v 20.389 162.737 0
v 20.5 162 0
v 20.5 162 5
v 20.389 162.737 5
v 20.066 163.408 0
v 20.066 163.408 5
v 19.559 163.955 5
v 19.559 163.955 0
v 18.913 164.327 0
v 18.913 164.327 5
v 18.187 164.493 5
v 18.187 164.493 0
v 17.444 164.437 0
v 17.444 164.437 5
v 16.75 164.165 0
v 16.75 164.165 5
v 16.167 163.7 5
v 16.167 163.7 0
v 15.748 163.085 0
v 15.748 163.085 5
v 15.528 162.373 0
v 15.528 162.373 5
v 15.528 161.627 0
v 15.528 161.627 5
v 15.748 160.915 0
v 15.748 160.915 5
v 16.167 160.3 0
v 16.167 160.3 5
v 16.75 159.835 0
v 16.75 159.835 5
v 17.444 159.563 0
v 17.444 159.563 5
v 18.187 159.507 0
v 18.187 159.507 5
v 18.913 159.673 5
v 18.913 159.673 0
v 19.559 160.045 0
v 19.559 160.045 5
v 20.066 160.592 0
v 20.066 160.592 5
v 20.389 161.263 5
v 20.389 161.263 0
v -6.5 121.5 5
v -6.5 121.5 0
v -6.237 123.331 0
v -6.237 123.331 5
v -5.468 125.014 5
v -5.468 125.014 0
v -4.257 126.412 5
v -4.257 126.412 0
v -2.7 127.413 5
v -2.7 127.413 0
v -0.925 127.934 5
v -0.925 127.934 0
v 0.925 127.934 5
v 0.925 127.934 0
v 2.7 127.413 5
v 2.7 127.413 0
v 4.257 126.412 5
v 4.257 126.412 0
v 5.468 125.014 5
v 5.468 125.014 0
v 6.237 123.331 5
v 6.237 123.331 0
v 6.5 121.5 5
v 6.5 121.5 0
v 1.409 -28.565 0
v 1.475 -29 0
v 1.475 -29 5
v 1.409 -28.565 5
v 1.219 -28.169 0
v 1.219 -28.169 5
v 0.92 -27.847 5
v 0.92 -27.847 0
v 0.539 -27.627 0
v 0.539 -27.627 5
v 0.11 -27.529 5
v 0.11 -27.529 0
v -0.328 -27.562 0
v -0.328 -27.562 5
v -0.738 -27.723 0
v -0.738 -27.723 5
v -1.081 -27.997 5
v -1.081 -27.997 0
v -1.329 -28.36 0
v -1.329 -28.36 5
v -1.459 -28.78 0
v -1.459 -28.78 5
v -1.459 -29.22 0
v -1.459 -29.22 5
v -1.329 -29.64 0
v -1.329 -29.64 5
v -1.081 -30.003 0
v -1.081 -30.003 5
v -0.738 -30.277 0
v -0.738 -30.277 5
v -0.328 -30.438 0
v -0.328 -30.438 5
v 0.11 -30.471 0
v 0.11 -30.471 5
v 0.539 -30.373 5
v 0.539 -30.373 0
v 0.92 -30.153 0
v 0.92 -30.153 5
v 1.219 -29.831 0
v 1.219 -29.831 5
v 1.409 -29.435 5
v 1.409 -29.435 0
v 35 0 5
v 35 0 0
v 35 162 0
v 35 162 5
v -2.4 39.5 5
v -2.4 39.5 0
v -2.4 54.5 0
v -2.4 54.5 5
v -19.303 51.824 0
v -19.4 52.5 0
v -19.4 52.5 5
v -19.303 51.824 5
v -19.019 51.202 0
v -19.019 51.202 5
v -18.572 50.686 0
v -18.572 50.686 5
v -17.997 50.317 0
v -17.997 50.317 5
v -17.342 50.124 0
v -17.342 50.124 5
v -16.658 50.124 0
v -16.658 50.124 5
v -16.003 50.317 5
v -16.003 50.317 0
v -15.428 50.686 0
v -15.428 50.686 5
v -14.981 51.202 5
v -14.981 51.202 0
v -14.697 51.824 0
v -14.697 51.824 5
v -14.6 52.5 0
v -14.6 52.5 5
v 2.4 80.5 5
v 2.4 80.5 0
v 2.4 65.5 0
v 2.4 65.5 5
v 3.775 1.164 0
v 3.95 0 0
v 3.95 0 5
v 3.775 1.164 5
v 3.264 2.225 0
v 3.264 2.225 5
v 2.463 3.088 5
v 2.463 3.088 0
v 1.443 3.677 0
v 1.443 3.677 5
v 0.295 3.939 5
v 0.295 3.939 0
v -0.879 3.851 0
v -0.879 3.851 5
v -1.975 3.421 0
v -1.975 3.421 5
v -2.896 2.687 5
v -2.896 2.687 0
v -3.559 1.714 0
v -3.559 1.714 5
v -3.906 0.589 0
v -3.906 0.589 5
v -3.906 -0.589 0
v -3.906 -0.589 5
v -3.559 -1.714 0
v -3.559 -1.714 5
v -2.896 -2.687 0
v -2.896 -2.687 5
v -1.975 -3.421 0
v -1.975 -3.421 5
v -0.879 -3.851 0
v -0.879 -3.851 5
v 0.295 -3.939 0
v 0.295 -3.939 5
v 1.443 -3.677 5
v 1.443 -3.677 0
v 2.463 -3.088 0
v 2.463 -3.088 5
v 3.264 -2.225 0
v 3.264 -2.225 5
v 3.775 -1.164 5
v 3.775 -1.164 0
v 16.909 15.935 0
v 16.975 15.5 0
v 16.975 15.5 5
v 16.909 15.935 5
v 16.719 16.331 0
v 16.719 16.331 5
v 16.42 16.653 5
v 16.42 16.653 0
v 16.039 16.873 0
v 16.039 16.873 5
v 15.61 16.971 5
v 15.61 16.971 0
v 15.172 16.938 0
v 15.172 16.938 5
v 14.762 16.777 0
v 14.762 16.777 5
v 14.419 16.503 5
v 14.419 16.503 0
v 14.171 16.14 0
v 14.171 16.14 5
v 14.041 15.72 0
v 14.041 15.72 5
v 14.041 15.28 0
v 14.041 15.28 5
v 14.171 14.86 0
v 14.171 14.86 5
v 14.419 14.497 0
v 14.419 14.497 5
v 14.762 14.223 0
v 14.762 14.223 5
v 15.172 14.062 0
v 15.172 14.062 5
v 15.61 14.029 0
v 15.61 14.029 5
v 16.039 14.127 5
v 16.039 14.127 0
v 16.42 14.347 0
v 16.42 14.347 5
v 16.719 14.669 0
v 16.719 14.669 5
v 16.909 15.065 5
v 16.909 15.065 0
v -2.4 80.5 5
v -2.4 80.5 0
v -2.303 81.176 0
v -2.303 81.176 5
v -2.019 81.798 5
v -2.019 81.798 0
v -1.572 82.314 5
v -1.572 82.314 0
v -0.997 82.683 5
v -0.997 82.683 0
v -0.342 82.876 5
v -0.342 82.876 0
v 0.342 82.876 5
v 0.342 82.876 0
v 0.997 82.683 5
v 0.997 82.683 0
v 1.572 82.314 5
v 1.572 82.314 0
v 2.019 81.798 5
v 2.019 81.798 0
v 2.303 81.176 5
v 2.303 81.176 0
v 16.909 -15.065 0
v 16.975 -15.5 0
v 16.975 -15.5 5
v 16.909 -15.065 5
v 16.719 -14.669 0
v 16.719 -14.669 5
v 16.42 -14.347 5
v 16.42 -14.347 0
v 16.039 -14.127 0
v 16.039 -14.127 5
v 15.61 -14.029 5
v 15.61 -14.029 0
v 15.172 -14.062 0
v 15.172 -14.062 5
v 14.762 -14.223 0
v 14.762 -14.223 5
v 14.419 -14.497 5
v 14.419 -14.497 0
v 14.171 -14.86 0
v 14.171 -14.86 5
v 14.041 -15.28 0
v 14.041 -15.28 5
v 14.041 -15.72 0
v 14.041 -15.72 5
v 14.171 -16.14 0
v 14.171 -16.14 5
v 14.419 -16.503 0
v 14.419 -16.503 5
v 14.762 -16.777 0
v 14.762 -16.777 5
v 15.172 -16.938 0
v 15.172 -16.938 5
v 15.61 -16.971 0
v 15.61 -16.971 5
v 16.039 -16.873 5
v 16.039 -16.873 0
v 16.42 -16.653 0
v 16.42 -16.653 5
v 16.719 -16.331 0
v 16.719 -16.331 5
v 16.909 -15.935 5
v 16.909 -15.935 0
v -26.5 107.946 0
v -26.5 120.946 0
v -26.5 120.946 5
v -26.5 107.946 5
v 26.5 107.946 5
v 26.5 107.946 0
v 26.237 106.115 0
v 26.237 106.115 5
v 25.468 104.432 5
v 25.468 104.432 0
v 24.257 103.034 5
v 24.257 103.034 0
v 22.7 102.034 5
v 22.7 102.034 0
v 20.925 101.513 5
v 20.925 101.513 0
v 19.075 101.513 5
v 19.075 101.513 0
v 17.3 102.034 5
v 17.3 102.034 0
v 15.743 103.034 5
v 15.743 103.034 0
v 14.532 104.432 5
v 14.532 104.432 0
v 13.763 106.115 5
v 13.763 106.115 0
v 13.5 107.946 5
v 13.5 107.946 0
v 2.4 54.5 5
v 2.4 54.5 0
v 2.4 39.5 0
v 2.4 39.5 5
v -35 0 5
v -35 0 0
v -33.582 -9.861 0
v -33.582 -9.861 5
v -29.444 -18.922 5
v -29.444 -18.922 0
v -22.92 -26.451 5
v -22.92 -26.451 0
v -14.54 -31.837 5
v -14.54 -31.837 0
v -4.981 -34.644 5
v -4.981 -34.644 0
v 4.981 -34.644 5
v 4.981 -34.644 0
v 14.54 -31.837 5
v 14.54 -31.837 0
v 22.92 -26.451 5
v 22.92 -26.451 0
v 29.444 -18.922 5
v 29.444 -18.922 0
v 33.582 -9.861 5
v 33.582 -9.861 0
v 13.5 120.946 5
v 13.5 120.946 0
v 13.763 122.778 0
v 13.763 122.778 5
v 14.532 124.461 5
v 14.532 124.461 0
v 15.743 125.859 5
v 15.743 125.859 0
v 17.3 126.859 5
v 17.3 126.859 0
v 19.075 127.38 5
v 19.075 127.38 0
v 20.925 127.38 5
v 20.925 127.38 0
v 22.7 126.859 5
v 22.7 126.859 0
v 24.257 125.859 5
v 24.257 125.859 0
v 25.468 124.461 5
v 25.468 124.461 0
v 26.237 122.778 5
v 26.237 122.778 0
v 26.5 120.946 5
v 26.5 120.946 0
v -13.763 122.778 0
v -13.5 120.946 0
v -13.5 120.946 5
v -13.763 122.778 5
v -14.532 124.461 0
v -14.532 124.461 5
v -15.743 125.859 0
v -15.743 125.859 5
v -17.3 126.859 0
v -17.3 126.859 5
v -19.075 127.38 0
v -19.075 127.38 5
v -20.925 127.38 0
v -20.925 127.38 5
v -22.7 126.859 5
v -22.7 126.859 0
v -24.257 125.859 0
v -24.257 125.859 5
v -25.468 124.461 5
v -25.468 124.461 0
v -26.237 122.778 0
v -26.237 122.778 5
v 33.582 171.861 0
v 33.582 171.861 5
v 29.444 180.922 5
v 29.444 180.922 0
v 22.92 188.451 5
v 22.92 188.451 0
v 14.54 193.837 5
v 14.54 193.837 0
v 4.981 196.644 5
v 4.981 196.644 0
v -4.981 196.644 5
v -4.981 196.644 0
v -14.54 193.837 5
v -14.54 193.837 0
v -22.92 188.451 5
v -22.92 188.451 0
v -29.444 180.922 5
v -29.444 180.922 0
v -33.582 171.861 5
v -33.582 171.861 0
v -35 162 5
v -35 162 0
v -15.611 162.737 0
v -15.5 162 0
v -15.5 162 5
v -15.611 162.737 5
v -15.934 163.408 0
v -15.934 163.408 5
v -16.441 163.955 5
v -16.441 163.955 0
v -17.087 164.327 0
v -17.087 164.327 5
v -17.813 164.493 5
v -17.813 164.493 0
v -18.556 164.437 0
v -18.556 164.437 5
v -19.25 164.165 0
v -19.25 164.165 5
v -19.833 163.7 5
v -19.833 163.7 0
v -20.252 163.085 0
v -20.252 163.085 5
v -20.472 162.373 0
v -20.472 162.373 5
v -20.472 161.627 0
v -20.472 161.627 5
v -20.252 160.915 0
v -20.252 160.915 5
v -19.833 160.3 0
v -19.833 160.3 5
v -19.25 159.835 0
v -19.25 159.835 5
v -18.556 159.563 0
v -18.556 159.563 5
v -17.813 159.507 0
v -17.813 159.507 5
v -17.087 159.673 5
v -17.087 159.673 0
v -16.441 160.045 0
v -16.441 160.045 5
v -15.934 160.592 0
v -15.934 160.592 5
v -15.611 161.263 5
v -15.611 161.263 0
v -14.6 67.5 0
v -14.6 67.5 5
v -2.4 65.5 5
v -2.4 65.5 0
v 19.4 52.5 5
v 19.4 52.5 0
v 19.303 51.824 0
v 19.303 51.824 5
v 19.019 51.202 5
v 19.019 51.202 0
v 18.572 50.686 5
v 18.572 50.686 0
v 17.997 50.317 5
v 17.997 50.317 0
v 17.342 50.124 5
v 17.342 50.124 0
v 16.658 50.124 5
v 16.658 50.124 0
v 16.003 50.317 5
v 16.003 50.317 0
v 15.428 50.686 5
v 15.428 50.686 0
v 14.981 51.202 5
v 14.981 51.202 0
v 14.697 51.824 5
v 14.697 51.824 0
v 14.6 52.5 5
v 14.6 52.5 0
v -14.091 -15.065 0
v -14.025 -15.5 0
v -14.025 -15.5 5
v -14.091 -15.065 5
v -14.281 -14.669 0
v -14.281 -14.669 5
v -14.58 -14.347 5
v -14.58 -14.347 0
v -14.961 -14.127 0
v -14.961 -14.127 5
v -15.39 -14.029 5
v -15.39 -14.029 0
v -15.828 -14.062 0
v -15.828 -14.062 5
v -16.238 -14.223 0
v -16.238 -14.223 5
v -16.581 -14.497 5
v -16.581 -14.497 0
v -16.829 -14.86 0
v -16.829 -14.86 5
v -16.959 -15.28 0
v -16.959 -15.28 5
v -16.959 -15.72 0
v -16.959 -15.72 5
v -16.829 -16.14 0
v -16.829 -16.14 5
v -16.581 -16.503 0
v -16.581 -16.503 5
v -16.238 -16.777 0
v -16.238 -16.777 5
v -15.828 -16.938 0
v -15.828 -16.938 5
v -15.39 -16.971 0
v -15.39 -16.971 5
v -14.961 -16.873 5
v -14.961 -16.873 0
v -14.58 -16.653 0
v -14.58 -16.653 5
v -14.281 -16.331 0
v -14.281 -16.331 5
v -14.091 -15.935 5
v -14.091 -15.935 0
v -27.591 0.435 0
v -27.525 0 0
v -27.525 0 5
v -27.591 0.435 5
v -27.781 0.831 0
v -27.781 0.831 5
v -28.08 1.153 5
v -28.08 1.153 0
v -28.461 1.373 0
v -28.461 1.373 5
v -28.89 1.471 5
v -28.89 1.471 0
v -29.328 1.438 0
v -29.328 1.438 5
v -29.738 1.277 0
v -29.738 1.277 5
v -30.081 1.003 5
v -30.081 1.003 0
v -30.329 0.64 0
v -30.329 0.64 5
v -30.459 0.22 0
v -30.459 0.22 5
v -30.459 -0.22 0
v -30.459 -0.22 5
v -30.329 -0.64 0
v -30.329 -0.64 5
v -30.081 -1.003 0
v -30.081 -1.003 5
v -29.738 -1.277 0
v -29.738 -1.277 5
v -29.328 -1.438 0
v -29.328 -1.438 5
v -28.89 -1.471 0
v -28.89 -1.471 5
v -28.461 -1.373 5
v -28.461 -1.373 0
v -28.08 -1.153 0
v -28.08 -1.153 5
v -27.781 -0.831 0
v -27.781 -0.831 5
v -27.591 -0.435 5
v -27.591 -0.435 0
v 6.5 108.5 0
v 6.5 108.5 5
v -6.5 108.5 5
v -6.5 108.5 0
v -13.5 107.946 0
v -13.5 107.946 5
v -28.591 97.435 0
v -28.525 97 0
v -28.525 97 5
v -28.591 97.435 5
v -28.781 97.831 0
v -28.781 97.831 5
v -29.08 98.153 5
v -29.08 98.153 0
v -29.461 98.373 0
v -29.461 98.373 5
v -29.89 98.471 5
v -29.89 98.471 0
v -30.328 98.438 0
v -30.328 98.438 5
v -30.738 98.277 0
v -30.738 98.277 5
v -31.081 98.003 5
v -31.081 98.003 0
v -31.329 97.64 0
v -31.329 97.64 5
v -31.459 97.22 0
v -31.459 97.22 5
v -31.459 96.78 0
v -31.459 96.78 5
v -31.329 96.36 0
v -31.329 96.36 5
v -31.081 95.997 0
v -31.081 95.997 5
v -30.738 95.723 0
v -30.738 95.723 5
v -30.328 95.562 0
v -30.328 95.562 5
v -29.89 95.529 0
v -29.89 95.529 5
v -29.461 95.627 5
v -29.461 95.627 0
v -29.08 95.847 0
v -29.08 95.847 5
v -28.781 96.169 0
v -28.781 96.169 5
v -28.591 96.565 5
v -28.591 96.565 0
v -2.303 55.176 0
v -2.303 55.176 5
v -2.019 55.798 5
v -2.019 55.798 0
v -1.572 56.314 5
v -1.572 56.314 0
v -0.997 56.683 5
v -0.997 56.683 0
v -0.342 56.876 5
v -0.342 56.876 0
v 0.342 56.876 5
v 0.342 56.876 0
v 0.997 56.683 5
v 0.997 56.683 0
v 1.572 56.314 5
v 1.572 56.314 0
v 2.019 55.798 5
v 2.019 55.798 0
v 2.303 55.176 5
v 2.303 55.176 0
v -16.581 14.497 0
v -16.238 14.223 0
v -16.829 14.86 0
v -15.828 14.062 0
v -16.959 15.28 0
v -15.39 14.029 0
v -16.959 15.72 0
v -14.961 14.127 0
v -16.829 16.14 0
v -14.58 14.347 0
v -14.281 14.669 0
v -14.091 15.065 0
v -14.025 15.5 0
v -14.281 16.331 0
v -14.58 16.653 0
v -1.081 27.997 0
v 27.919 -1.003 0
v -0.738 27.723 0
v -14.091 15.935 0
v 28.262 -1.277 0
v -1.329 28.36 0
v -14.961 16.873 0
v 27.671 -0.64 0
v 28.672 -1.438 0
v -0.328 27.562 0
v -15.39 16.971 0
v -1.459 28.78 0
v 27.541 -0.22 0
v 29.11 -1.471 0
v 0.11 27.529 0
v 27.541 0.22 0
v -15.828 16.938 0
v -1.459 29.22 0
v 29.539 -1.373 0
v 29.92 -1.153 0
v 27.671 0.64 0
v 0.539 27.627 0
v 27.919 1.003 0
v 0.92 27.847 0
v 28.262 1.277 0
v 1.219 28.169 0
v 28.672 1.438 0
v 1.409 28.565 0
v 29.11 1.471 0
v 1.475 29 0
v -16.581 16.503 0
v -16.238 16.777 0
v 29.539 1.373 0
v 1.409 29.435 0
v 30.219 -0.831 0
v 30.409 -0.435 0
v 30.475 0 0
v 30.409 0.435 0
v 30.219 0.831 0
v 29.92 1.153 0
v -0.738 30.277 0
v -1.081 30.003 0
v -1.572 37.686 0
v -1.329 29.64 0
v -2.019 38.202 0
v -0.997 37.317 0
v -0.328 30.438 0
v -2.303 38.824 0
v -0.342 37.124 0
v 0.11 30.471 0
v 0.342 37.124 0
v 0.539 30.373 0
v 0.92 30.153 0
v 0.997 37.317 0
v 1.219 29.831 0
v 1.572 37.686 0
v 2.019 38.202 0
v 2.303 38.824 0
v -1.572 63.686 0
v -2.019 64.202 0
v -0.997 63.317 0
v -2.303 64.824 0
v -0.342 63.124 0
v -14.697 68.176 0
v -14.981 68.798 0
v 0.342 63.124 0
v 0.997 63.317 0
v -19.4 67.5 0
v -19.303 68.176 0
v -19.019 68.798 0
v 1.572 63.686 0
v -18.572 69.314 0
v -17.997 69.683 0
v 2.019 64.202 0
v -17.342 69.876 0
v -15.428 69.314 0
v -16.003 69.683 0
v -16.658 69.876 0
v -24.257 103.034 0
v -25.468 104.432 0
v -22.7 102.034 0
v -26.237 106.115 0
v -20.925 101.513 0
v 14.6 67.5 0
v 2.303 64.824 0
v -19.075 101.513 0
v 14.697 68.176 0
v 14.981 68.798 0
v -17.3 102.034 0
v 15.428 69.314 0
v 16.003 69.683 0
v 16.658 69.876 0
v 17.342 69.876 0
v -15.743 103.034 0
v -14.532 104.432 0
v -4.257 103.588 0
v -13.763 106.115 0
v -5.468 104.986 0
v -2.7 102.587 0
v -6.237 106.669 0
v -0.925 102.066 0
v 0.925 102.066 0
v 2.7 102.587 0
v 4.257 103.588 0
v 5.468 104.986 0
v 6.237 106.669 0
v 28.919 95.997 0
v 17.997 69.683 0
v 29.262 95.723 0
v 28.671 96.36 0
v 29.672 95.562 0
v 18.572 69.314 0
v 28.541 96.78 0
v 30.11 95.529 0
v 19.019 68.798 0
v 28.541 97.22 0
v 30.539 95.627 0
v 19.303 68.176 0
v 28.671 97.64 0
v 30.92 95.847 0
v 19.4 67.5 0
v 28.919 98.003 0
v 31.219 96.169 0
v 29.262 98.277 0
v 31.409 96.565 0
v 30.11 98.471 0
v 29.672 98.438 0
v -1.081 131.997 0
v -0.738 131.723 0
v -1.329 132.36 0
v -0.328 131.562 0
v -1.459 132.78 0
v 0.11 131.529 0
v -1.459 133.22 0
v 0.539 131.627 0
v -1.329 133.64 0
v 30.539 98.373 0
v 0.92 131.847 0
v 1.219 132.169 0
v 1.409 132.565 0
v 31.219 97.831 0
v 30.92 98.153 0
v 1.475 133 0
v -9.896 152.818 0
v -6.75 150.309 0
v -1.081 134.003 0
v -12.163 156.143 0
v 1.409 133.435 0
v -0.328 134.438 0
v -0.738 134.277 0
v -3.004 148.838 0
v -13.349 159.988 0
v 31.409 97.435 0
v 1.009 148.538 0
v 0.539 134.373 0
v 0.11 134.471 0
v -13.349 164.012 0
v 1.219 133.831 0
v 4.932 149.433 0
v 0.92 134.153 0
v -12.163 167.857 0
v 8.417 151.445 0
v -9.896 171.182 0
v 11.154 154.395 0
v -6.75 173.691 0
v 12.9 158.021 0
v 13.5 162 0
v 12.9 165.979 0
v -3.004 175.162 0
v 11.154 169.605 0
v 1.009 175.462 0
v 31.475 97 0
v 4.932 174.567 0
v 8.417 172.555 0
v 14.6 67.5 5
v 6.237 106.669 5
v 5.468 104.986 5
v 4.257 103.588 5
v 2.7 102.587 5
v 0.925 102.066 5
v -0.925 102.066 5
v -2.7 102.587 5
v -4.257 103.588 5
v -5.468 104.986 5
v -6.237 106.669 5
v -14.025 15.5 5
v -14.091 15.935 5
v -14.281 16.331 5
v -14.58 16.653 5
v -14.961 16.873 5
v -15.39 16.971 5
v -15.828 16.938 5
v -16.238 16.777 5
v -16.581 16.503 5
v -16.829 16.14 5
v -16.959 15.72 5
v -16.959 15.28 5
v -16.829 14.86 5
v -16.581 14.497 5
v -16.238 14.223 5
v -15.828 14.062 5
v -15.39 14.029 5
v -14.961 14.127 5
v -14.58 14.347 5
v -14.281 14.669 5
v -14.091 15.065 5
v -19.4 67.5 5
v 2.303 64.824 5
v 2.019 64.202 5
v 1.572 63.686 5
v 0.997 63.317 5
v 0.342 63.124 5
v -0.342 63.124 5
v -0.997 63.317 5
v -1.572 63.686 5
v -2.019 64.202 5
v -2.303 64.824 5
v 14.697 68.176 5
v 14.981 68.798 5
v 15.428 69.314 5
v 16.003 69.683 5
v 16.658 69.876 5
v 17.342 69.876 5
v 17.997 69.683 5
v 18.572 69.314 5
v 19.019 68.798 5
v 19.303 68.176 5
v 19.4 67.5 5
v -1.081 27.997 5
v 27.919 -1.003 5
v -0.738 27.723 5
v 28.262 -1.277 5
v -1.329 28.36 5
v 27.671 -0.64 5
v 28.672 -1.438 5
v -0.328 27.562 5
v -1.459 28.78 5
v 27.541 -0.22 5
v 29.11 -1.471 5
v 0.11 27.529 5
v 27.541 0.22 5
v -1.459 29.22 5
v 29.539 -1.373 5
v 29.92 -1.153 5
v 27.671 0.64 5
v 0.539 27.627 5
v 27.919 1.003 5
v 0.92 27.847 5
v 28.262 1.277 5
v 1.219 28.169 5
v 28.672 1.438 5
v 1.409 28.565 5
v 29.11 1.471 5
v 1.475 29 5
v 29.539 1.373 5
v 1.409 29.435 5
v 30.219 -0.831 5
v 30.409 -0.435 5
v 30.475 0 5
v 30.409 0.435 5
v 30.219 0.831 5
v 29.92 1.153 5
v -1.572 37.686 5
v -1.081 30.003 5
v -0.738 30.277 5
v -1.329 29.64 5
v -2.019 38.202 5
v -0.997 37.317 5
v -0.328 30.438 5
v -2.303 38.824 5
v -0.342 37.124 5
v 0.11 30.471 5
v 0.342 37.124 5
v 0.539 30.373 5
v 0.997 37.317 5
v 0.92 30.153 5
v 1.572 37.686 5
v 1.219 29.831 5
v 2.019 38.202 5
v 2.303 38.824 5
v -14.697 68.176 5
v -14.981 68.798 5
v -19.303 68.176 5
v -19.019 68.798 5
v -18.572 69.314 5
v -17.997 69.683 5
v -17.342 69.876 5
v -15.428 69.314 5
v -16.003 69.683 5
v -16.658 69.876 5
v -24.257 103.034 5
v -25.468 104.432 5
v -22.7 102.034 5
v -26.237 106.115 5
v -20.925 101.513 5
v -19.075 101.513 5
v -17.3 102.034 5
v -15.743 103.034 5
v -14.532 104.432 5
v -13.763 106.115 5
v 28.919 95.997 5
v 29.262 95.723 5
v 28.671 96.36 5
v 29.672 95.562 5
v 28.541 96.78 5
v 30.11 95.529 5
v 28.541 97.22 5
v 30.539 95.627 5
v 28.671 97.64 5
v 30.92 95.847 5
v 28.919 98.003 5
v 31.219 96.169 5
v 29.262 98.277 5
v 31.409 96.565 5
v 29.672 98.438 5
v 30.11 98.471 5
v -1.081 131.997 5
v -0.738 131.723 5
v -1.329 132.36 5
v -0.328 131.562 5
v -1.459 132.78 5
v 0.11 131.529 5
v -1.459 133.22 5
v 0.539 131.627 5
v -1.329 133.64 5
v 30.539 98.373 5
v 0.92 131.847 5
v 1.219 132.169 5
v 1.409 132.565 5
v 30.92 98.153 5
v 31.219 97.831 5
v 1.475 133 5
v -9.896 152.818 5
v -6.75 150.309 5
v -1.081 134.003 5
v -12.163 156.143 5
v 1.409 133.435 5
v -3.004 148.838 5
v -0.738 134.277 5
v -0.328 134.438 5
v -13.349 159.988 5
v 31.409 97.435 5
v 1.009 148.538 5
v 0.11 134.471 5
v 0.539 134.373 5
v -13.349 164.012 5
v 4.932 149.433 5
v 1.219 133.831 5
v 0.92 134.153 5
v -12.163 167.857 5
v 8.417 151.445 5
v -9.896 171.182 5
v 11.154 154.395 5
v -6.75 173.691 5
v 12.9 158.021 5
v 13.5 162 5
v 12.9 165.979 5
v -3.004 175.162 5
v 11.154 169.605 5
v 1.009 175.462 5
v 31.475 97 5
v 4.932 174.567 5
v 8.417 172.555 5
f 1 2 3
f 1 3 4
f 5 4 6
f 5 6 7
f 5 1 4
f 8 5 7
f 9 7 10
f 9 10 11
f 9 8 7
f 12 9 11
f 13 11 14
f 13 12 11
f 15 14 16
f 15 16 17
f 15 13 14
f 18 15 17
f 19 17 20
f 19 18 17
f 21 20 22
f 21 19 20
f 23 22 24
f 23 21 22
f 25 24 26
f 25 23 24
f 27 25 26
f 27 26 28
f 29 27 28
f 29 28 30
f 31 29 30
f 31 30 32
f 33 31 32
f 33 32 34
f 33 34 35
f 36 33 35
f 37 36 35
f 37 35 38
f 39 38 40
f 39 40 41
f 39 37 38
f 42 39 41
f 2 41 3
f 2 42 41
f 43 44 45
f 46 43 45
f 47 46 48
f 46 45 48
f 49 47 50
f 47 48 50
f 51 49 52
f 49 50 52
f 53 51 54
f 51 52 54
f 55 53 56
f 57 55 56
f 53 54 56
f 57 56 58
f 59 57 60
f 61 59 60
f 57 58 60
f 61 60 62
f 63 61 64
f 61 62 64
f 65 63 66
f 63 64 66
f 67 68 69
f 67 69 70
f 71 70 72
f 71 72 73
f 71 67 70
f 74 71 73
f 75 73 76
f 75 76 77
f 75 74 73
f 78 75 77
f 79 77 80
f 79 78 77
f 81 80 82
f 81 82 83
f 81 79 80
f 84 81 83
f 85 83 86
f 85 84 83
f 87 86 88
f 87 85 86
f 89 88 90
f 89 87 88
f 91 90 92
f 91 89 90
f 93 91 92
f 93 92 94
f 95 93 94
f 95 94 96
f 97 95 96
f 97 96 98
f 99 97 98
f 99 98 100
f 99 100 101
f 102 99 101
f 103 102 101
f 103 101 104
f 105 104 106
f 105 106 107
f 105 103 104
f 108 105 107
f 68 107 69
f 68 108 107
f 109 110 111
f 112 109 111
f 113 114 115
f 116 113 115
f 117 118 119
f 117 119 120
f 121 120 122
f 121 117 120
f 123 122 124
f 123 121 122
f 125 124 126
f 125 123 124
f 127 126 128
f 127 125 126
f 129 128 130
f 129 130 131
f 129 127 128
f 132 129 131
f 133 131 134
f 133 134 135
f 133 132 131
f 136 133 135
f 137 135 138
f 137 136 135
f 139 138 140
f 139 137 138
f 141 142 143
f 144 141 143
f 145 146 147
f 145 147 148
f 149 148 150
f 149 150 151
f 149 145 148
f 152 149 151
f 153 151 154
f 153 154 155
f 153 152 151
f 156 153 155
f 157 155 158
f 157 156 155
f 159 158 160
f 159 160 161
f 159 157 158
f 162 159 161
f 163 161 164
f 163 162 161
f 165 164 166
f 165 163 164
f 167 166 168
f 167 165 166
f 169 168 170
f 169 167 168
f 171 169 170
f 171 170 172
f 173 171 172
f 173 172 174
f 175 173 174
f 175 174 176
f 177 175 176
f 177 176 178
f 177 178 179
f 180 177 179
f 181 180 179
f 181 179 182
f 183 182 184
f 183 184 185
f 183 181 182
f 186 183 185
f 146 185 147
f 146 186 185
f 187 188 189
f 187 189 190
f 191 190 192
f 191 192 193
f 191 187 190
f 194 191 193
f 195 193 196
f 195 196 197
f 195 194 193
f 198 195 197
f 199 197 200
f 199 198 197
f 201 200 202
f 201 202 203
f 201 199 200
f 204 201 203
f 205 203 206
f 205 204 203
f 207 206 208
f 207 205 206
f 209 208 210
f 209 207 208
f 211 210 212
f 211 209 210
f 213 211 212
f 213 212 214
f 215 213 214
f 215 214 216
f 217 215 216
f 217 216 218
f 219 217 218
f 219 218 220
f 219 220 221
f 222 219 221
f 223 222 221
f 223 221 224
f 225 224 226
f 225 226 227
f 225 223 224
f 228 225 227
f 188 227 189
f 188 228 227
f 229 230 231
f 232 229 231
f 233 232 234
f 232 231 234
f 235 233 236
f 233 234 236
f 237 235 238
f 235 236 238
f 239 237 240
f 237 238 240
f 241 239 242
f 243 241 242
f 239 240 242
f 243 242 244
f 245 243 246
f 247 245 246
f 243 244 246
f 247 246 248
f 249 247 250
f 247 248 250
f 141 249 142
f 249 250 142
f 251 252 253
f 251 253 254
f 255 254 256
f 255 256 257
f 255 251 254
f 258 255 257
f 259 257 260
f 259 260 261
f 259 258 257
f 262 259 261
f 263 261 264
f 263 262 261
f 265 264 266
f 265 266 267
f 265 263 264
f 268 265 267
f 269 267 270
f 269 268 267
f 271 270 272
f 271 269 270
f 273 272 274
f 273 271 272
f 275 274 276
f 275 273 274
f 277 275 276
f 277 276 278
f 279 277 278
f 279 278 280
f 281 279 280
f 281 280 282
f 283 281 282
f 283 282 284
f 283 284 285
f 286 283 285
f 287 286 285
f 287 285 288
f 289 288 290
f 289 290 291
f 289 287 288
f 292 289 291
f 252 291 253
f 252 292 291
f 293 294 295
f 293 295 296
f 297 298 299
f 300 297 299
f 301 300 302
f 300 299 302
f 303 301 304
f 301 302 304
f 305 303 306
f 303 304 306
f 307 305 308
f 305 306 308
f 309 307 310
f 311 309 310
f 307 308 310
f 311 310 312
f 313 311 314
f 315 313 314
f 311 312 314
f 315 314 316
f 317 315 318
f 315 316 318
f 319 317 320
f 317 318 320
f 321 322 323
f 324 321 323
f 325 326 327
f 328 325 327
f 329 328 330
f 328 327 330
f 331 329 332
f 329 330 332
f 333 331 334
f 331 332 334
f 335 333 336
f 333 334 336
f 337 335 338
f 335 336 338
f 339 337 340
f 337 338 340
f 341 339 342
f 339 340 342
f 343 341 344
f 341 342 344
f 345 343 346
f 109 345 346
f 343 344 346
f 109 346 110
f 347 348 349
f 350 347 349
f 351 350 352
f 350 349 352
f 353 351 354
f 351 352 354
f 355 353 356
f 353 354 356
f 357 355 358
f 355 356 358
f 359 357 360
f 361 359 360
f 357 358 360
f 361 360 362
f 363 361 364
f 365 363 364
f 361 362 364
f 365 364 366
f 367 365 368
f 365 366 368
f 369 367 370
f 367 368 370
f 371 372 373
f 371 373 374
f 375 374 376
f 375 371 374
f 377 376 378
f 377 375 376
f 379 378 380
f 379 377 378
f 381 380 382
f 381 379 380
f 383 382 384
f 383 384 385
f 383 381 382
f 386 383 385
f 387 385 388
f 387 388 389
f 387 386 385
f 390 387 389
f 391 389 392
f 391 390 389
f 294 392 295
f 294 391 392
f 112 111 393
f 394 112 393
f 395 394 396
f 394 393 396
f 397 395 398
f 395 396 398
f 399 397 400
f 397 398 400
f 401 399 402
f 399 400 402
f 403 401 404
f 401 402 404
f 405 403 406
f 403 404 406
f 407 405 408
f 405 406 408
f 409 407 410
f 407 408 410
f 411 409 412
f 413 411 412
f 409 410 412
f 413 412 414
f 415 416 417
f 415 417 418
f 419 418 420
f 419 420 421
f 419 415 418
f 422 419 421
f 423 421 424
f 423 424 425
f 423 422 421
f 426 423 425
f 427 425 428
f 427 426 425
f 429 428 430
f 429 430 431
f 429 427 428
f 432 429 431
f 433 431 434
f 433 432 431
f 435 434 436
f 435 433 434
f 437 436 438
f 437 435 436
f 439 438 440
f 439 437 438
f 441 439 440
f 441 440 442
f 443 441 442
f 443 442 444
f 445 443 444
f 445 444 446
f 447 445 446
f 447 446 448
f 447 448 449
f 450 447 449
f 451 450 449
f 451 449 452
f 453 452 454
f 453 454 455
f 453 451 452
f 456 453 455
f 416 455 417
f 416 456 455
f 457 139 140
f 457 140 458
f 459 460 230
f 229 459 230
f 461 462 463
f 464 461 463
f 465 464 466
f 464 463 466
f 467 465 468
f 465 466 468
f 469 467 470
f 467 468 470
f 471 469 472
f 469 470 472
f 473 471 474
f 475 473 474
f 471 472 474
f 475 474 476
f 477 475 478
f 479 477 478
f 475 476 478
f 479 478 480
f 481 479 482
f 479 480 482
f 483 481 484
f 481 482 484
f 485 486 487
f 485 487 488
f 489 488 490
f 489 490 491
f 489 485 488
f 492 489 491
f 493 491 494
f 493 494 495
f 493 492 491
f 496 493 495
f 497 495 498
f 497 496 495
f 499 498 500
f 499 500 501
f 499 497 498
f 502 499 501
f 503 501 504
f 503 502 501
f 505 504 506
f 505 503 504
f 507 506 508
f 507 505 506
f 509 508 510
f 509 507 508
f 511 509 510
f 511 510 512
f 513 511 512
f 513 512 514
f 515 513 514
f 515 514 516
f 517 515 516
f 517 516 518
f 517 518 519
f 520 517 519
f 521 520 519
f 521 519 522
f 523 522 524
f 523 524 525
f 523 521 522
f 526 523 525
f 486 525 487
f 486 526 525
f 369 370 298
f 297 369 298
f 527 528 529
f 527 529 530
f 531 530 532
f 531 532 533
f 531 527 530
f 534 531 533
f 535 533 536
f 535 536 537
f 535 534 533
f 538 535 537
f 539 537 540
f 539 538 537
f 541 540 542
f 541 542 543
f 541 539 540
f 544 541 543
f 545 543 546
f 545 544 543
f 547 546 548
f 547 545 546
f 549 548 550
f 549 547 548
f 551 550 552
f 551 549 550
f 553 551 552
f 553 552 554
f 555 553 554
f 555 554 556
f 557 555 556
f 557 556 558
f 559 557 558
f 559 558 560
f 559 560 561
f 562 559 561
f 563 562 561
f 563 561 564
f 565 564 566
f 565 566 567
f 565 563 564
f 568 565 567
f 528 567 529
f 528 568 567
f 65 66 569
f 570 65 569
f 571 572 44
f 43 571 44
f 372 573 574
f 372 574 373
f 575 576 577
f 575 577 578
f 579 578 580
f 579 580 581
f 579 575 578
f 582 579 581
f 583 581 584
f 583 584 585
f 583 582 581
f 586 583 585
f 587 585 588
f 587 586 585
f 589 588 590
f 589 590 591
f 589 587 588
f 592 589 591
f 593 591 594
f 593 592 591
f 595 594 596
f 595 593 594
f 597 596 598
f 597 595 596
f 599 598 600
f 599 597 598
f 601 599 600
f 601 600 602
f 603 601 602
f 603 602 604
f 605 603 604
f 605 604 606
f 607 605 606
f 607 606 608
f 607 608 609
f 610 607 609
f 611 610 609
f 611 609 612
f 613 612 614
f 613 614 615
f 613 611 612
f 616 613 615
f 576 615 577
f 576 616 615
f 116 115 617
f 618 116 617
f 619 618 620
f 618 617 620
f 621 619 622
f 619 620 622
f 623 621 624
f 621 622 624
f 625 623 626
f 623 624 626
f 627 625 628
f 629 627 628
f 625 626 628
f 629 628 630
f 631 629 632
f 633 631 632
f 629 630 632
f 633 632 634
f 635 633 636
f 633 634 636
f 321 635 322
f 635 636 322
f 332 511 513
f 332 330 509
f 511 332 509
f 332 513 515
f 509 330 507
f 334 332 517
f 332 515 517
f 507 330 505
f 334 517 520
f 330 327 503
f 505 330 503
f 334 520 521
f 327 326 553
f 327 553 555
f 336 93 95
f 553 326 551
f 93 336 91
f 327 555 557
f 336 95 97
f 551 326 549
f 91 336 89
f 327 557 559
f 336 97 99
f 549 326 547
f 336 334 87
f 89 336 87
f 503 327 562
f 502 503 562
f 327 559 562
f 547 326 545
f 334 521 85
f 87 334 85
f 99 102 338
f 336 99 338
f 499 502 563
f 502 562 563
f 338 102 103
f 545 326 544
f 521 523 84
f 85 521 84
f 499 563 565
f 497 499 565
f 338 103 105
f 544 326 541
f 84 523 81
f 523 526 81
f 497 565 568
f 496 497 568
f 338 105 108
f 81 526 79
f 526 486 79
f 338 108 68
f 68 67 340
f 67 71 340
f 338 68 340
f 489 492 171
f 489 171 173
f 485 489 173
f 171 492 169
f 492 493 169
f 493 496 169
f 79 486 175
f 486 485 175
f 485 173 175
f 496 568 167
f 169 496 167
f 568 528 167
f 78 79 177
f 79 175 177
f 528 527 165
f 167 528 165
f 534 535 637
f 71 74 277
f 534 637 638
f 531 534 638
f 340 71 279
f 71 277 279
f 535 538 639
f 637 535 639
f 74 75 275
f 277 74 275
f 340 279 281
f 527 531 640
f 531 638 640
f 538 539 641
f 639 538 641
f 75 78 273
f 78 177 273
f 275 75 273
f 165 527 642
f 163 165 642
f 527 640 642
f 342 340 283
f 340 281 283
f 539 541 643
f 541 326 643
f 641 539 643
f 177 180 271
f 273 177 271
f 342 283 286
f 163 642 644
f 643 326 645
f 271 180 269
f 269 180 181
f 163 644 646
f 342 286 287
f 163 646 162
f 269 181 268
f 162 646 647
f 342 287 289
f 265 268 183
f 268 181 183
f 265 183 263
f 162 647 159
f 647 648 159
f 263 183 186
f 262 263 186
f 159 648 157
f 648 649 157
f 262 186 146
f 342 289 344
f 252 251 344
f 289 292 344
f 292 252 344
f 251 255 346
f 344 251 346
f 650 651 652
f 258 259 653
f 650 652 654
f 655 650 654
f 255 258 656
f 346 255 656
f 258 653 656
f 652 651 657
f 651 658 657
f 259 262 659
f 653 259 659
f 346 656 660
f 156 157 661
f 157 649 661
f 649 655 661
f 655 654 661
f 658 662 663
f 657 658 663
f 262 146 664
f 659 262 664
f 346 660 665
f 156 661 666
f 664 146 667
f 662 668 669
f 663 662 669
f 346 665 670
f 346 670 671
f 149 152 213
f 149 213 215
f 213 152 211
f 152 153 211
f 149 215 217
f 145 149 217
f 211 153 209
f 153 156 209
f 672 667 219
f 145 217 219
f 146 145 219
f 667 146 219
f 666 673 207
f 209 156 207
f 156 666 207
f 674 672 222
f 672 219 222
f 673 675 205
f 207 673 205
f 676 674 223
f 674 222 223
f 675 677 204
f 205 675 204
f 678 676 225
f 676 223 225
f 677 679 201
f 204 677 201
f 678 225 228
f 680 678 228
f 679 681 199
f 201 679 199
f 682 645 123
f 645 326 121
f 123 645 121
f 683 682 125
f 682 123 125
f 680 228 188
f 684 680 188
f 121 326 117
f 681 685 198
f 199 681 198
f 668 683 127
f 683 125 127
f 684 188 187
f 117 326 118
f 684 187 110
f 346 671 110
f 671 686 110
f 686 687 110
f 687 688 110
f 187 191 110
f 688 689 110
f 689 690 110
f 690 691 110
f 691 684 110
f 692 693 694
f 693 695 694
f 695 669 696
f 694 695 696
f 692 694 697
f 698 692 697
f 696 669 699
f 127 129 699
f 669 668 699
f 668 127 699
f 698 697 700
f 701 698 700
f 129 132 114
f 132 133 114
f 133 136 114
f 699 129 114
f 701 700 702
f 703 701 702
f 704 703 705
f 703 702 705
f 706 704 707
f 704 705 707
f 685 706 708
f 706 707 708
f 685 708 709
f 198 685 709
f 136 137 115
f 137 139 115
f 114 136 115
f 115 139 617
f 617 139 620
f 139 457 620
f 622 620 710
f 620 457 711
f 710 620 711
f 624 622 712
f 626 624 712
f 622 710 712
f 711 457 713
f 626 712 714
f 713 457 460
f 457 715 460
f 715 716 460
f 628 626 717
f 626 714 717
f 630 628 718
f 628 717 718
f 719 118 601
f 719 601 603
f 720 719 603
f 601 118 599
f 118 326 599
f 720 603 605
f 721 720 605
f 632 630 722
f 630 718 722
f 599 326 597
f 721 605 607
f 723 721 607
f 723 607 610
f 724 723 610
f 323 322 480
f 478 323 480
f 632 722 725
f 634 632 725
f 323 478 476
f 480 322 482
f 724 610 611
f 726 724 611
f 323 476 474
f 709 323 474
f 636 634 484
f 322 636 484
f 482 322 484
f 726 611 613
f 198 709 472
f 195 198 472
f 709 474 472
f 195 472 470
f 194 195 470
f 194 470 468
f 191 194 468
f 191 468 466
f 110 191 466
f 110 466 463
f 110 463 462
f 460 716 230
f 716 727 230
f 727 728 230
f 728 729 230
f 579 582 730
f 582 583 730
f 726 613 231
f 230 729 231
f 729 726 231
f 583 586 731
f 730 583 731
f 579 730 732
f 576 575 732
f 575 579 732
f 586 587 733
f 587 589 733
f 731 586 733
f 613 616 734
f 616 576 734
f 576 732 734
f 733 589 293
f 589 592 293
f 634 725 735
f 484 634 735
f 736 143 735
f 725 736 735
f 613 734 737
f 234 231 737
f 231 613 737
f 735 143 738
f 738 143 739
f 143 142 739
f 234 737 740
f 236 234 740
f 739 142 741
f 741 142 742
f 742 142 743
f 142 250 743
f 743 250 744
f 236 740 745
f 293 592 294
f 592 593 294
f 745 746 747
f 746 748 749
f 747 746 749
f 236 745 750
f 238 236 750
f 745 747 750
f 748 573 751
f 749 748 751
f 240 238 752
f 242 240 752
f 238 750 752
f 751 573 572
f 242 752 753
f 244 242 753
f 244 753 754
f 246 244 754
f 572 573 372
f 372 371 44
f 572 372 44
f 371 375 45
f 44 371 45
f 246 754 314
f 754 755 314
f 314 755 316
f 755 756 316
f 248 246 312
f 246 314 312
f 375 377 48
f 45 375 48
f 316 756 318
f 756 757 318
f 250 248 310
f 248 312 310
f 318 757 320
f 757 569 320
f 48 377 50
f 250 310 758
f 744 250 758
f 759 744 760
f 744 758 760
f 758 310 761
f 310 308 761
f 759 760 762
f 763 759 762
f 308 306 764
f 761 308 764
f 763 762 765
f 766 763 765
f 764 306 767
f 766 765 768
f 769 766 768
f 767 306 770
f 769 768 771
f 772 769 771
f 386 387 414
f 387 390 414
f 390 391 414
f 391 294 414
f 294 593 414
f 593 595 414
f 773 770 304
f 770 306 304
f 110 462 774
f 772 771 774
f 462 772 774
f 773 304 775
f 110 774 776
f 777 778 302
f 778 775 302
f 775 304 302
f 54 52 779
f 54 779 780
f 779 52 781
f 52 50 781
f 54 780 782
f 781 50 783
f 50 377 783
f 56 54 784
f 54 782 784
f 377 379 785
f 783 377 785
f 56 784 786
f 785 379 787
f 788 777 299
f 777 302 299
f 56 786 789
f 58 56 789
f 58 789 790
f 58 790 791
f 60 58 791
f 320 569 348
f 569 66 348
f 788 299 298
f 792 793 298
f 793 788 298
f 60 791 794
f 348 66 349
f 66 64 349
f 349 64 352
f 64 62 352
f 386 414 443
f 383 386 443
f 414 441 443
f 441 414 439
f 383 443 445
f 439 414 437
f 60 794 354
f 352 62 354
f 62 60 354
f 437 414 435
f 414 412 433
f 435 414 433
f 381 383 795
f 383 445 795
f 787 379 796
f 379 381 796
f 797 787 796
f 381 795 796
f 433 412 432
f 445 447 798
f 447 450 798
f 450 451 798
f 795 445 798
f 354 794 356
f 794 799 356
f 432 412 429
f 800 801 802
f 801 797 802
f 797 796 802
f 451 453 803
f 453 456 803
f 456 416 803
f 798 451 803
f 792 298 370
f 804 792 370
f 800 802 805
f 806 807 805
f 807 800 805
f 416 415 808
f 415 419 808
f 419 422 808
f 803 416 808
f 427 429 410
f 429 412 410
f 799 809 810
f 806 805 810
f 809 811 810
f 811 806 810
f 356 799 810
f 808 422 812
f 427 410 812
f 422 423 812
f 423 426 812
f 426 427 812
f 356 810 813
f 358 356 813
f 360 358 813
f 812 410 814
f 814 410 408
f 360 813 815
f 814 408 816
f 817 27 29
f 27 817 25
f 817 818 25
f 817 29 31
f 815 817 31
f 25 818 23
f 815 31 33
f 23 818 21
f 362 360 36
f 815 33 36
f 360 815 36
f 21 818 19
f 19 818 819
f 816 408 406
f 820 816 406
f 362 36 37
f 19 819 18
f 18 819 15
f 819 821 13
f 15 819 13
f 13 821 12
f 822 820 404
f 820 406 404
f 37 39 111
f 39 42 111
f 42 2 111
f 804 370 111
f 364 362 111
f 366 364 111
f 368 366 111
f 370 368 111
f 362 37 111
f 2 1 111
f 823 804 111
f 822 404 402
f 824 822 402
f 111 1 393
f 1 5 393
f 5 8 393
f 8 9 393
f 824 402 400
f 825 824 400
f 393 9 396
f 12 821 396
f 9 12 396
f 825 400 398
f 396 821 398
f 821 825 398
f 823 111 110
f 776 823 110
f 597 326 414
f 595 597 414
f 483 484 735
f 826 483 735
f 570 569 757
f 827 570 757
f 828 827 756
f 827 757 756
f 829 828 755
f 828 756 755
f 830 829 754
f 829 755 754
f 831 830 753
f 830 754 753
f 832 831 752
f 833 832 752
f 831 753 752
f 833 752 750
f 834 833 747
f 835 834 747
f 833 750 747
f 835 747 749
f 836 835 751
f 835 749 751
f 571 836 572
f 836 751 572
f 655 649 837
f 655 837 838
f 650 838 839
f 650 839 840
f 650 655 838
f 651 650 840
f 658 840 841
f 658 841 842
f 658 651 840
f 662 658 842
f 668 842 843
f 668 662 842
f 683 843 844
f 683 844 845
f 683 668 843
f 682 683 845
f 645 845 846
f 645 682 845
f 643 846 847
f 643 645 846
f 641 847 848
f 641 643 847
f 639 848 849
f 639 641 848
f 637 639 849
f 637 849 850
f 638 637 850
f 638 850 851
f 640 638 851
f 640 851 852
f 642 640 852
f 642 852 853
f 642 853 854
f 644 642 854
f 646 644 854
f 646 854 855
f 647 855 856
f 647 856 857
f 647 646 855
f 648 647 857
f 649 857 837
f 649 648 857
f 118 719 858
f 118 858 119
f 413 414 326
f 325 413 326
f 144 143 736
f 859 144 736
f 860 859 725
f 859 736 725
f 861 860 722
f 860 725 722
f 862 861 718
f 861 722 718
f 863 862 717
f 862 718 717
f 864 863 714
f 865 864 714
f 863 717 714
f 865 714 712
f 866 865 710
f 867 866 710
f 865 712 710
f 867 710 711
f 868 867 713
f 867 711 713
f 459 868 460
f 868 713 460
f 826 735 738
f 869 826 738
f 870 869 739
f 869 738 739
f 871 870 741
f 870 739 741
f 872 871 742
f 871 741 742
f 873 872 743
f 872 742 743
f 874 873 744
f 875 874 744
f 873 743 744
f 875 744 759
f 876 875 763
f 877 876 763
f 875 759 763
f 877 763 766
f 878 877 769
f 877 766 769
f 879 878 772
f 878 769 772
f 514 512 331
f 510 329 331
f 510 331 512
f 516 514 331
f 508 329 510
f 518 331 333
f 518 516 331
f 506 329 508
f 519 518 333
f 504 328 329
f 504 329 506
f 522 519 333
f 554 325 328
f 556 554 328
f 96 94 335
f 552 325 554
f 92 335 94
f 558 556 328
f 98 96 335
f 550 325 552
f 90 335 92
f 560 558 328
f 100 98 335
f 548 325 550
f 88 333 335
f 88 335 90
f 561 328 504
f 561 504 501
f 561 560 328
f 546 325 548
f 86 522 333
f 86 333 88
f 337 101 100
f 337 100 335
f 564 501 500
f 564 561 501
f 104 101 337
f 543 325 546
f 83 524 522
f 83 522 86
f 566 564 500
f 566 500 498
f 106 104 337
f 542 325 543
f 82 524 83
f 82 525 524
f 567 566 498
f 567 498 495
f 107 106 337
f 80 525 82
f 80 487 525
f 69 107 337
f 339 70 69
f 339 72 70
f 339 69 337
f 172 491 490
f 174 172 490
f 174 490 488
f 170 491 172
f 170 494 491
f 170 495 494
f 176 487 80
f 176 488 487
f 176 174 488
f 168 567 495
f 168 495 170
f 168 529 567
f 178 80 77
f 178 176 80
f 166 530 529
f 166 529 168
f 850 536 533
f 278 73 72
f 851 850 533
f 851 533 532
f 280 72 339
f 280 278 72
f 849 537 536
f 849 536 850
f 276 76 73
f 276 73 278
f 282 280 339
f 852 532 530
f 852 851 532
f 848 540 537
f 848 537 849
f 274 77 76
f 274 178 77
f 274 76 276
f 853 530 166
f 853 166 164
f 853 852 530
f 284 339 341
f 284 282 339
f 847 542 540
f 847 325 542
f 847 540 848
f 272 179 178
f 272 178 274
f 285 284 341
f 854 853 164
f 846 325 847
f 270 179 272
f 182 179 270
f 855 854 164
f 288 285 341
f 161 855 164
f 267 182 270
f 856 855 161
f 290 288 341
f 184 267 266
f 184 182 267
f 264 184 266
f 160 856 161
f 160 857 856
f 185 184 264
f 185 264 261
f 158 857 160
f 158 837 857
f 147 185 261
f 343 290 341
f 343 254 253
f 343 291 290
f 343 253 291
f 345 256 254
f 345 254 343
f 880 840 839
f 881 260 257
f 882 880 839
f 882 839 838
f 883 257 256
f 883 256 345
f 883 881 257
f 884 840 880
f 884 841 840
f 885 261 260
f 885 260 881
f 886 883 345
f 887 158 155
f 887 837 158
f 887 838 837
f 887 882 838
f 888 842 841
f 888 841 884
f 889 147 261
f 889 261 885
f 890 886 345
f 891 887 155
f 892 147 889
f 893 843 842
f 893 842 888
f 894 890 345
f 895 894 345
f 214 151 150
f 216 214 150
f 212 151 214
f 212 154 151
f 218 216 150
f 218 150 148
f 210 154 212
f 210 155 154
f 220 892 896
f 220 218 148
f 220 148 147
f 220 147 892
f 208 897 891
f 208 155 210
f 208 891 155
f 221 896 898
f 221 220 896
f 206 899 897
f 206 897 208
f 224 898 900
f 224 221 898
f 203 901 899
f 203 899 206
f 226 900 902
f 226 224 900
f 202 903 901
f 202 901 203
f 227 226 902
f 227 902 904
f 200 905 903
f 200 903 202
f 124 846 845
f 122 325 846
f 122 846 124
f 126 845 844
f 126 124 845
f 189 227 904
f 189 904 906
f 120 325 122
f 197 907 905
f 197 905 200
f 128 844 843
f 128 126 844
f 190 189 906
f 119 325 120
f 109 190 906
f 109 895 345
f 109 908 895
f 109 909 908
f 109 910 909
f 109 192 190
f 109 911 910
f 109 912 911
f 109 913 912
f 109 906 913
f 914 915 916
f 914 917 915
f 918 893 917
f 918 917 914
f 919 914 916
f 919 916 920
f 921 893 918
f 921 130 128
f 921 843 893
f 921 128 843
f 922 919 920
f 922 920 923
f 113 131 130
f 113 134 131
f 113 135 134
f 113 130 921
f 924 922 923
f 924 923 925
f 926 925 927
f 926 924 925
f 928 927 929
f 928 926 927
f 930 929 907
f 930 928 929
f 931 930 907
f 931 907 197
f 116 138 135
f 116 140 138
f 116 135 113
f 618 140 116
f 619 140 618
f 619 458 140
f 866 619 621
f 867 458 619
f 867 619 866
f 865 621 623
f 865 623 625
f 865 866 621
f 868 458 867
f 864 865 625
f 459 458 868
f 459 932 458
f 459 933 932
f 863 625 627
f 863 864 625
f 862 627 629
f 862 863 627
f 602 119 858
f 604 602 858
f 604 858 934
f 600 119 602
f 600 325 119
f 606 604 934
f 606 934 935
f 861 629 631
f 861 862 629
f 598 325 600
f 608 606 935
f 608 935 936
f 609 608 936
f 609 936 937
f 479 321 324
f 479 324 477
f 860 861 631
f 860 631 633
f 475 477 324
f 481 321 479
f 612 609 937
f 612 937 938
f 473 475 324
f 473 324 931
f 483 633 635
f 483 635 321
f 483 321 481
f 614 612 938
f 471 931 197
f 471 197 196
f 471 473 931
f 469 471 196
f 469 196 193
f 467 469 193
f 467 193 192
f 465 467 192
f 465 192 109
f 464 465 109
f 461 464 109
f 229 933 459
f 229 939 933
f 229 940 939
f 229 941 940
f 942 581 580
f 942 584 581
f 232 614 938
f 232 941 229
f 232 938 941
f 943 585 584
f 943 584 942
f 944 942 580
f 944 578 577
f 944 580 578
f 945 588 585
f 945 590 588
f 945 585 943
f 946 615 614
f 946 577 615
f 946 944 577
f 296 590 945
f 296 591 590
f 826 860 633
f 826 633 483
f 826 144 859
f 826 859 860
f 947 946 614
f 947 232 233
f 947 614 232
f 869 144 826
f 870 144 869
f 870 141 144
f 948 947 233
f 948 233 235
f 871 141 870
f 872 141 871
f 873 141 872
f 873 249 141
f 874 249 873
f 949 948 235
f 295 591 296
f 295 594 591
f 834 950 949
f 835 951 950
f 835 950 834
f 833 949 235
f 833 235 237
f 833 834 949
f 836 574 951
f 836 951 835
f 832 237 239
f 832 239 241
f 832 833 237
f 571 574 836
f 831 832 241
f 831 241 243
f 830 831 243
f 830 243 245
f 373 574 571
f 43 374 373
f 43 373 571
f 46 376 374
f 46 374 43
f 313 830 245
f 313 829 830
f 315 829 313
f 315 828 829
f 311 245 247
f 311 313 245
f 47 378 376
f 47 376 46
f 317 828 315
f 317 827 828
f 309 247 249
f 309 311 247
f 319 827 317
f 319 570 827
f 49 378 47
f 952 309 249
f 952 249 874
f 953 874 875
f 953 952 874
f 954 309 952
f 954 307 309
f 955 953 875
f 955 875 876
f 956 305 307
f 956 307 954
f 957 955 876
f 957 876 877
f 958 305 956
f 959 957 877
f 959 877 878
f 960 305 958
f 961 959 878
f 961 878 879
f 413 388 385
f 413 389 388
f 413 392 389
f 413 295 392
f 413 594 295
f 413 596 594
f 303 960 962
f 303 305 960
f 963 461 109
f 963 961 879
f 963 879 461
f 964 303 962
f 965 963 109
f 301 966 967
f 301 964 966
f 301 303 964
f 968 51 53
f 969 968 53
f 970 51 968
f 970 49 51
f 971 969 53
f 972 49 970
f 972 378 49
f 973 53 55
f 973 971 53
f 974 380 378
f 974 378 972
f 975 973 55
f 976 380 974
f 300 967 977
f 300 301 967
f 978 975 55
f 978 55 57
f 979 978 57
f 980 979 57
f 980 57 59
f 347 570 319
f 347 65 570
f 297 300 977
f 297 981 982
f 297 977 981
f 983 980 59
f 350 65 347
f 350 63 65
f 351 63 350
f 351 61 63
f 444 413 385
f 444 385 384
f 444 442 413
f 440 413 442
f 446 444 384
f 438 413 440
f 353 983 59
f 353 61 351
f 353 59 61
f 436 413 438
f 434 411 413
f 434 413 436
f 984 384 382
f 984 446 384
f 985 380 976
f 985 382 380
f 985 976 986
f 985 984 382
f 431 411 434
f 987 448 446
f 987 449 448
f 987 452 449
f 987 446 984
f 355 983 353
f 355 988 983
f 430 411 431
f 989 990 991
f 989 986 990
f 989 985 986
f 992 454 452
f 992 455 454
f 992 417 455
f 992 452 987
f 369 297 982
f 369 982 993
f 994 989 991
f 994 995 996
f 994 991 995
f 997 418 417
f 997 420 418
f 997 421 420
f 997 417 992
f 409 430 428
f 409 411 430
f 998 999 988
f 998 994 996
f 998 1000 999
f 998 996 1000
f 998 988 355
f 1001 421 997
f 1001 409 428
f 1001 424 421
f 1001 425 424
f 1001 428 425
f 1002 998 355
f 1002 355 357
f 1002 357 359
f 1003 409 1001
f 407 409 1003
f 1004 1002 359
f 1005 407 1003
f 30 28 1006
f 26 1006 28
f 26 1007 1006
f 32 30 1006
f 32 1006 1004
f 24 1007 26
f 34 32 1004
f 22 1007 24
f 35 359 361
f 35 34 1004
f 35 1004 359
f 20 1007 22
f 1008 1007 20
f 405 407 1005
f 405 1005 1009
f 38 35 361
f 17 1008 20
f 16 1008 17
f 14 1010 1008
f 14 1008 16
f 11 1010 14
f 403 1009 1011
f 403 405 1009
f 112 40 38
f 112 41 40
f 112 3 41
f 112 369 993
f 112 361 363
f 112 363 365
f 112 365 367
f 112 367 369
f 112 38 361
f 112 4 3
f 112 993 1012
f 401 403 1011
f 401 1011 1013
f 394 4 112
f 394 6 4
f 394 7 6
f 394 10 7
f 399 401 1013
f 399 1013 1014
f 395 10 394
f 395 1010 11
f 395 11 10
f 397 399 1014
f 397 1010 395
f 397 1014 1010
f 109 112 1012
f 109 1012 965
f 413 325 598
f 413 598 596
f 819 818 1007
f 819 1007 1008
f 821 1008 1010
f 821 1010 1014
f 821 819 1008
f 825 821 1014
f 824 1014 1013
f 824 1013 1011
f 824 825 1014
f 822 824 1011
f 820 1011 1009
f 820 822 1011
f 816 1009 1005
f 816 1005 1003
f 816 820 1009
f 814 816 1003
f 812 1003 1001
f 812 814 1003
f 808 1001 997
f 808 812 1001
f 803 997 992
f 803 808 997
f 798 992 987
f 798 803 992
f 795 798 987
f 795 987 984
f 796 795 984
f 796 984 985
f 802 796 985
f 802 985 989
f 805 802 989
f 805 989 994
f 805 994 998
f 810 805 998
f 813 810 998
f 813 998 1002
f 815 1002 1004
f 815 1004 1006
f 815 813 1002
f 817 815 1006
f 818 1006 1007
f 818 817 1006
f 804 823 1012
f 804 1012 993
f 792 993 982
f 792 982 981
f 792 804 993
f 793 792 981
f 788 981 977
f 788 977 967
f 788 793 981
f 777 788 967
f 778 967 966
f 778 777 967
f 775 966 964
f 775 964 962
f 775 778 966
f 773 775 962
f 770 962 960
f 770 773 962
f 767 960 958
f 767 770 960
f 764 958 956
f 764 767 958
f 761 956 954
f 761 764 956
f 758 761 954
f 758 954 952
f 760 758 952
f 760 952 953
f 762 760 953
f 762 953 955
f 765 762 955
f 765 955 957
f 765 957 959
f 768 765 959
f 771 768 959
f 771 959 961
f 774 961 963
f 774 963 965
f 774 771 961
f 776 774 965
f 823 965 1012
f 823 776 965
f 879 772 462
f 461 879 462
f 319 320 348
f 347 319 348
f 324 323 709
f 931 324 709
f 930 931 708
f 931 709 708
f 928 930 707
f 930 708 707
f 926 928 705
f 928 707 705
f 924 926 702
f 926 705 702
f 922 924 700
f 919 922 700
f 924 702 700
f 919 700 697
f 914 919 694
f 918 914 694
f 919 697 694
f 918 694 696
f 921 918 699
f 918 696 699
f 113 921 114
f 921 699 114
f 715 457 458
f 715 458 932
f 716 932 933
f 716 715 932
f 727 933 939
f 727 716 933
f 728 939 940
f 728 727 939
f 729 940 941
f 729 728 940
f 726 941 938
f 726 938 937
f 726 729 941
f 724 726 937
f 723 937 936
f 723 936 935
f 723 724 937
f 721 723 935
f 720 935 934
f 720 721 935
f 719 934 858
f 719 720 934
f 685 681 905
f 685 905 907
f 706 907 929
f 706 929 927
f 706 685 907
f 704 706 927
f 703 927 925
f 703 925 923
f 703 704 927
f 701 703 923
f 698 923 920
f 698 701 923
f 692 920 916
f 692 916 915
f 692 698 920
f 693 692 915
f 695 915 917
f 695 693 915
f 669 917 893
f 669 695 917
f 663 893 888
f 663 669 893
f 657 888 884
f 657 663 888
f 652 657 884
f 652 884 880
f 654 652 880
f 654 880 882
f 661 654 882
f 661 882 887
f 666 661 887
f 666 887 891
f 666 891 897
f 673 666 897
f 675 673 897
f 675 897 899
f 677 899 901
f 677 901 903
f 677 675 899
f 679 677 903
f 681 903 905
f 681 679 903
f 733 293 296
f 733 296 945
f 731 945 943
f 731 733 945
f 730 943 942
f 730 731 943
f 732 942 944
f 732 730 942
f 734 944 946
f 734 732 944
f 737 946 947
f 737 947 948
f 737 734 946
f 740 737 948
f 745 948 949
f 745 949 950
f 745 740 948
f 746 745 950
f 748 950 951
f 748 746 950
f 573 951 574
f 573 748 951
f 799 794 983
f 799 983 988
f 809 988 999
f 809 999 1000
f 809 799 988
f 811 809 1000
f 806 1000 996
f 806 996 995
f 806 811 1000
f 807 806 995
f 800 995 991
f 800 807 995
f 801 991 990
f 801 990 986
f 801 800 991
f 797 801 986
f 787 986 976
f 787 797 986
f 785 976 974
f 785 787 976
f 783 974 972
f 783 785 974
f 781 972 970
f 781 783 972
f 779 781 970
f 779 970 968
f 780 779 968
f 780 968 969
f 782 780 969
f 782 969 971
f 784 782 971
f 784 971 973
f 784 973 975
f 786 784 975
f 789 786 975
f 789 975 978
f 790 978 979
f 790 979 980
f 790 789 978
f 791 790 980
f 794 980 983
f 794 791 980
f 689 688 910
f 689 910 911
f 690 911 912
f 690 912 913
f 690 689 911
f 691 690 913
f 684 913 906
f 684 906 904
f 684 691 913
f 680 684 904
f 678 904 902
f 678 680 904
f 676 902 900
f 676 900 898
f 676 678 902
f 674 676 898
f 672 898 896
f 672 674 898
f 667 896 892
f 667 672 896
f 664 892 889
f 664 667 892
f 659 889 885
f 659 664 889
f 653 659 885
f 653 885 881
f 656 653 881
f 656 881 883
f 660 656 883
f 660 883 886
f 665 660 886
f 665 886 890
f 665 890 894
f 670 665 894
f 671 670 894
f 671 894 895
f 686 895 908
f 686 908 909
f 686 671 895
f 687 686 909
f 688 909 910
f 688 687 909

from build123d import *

# Parameters (mm, degrees)
SKETCH1_R           = 3.95
SKETCH1_R_2         = 1.475
SKETCH1_R_3         = 13.5
SKETCH1_R_4         = 2.5
BOSS_EXTRUDE1_DEPTH = 5


with BuildPart() as part:
    # Sketch1 → Boss-Extrude1 (new body)
    with BuildSketch(Plane.XY):
        with BuildLine():
            Line((35, 0), (35, 162))
            ThreePointArc((35, 162), (0, 197), (-35, 162))
            Line((-35, 162), (-35, 0))
            ThreePointArc((-35, 0), (0, -35), (35, 0))
        make_face()
        Circle(SKETCH1_R, mode=Mode.SUBTRACT)
        with Locations((15.5, 15.5)):
            Circle(SKETCH1_R_2, mode=Mode.SUBTRACT)
        with Locations((15.5, -15.5)):
            Circle(SKETCH1_R_2, mode=Mode.SUBTRACT)
        with Locations((-15.5, -15.5)):
            Circle(SKETCH1_R_2, mode=Mode.SUBTRACT)
        with Locations((-15.5, 15.5)):
            Circle(SKETCH1_R_2, mode=Mode.SUBTRACT)
        with Locations((0, 29)):
            Circle(SKETCH1_R_2, mode=Mode.SUBTRACT)
        with Locations((0, 162)):
            Circle(SKETCH1_R_3, mode=Mode.SUBTRACT)
        with Locations((-18, 162)):
            Circle(SKETCH1_R_4, mode=Mode.SUBTRACT)
        with Locations((18, 162)):
            Circle(SKETCH1_R_4, mode=Mode.SUBTRACT)
        with Locations((0, 133)):
            Circle(SKETCH1_R_2, mode=Mode.SUBTRACT)
        with Locations((-30, 97)):
            Circle(SKETCH1_R_2, mode=Mode.SUBTRACT)
        with Locations((30, 97)):
            Circle(SKETCH1_R_2, mode=Mode.SUBTRACT)
        with Locations((29, 0)):
            Circle(SKETCH1_R_2, mode=Mode.SUBTRACT)
        with Locations((0, -29)):
            Circle(SKETCH1_R_2, mode=Mode.SUBTRACT)
        with Locations((-29, 0)):
            Circle(SKETCH1_R_2, mode=Mode.SUBTRACT)
        with BuildLine():
            Line((2.4, 54.5), (2.4, 39.5))
            ThreePointArc((2.4, 39.5), (0, 37.1), (-2.4, 39.5))
            Line((-2.4, 39.5), (-2.4, 54.5))
            ThreePointArc((-2.4, 54.5), (0, 56.9), (2.4, 54.5))
        make_face(mode=Mode.SUBTRACT)
        with BuildLine():
            Line((2.4, 80.5), (2.4, 65.5))
            ThreePointArc((2.4, 65.5), (0, 63.1), (-2.4, 65.5))
            Line((-2.4, 65.5), (-2.4, 80.5))
            ThreePointArc((-2.4, 80.5), (0, 82.9), (2.4, 80.5))
        make_face(mode=Mode.SUBTRACT)
        with BuildLine():
            Line((19.4, 67.5), (19.4, 52.5))
            ThreePointArc((19.4, 52.5), (17, 50.1), (14.6, 52.5))
            Line((14.6, 52.5), (14.6, 67.5))
            ThreePointArc((14.6, 67.5), (17, 69.9), (19.4, 67.5))
        make_face(mode=Mode.SUBTRACT)
        with BuildLine():
            Line((-19.4, 67.5), (-19.4, 52.5))
            ThreePointArc((-19.4, 52.5), (-17, 50.1), (-14.6, 52.5))
            Line((-14.6, 52.5), (-14.6, 67.5))
            ThreePointArc((-14.6, 67.5), (-17, 69.9), (-19.4, 67.5))
        make_face(mode=Mode.SUBTRACT)
        with BuildLine():
            Line((6.5, 121.5), (6.5, 108.5))
            ThreePointArc((6.5, 108.5), (0, 102), (-6.5, 108.5))
            Line((-6.5, 108.5), (-6.5, 121.5))
            ThreePointArc((-6.5, 121.5), (0, 128), (6.5, 121.5))
        make_face(mode=Mode.SUBTRACT)
        with BuildLine():
            Line((26.5, 120.946496324), (26.5, 107.946496324))
            ThreePointArc((26.5, 107.946496324), (20, 101.446496324), (13.5, 107.946496324))
            Line((13.5, 107.946496324), (13.5, 120.946496324))
            ThreePointArc((13.5, 120.946496324), (20, 127.446496324), (26.5, 120.946496324))
        make_face(mode=Mode.SUBTRACT)
        with BuildLine():
            Line((-26.5, 120.946496324), (-26.5, 107.946496324))
            ThreePointArc((-26.5, 107.946496324), (-20, 101.446496324), (-13.5, 107.946496324))
            Line((-13.5, 107.946496324), (-13.5, 120.946496324))
            ThreePointArc((-13.5, 120.946496324), (-20, 127.446496324), (-26.5, 120.946496324))
        make_face(mode=Mode.SUBTRACT)
    extrude(amount=BOSS_EXTRUDE1_DEPTH)


solid = part.part
